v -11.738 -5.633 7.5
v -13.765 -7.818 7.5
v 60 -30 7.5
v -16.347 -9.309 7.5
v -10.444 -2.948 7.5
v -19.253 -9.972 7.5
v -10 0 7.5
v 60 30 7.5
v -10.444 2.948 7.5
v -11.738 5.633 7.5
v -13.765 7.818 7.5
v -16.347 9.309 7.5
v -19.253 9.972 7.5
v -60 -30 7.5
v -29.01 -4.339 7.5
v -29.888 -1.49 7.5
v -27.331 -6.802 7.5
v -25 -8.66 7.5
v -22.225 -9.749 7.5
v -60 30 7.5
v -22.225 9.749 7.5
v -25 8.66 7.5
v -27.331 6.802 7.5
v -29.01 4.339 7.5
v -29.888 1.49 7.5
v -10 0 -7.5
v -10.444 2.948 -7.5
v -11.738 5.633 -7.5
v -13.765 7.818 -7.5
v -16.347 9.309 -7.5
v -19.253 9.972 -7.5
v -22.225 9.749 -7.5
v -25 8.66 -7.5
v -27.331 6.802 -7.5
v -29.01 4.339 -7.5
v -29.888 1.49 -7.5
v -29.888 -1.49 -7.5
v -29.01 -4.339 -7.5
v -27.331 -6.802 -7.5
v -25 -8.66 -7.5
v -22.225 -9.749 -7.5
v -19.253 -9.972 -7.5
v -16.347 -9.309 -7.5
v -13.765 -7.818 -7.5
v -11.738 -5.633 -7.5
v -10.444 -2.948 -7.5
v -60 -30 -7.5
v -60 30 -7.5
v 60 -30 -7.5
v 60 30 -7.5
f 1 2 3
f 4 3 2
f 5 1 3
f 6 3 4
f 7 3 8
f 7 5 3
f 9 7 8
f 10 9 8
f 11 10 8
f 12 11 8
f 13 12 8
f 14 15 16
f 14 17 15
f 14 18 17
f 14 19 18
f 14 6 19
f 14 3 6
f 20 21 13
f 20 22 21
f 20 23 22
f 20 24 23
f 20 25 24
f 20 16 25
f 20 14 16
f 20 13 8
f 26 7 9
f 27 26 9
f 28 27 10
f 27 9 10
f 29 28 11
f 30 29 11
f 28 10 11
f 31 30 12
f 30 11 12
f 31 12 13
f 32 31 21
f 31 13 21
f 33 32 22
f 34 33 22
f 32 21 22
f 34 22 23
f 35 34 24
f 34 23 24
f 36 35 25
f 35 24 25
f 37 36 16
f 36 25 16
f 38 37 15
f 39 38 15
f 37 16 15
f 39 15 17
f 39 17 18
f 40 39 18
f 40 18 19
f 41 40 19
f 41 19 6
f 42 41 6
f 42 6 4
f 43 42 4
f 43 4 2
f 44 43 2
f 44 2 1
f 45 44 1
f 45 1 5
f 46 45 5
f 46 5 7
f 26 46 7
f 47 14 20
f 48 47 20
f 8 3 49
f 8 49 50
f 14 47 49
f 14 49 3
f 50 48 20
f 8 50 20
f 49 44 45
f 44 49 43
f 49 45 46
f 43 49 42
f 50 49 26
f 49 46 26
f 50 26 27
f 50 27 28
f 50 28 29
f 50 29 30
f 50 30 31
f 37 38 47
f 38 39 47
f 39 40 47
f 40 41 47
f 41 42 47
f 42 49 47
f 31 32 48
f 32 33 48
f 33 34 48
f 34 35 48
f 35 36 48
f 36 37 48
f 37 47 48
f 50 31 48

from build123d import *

# Parameters (mm, degrees)
PLAT_W                      = 60
PLAT_H                      = 15
EL_MENT_M_CANO_SOUD_1_DEPTH = 120
ESQUISSE2_R                 = 10
ENL_V_MAT_EXTRU_1_DEPTH     = 20


with BuildPart() as part:
    # plat → Elément mécano-soudé1 (new body)
    with BuildSketch(Plane.YZ.offset(-60)):
        Rectangle(PLAT_W, PLAT_H)
    extrude(amount=EL_MENT_M_CANO_SOUD_1_DEPTH)

    # Esquisse2 → Enlèv. mat.-Extru.1 (cut)
    with BuildSketch(Plane.XY.offset(7.5)):
        with Locations((-20, 0)):
            Circle(ESQUISSE2_R)
    extrude(amount=-ENL_V_MAT_EXTRU_1_DEPTH, mode=Mode.SUBTRACT)


solid = part.part
